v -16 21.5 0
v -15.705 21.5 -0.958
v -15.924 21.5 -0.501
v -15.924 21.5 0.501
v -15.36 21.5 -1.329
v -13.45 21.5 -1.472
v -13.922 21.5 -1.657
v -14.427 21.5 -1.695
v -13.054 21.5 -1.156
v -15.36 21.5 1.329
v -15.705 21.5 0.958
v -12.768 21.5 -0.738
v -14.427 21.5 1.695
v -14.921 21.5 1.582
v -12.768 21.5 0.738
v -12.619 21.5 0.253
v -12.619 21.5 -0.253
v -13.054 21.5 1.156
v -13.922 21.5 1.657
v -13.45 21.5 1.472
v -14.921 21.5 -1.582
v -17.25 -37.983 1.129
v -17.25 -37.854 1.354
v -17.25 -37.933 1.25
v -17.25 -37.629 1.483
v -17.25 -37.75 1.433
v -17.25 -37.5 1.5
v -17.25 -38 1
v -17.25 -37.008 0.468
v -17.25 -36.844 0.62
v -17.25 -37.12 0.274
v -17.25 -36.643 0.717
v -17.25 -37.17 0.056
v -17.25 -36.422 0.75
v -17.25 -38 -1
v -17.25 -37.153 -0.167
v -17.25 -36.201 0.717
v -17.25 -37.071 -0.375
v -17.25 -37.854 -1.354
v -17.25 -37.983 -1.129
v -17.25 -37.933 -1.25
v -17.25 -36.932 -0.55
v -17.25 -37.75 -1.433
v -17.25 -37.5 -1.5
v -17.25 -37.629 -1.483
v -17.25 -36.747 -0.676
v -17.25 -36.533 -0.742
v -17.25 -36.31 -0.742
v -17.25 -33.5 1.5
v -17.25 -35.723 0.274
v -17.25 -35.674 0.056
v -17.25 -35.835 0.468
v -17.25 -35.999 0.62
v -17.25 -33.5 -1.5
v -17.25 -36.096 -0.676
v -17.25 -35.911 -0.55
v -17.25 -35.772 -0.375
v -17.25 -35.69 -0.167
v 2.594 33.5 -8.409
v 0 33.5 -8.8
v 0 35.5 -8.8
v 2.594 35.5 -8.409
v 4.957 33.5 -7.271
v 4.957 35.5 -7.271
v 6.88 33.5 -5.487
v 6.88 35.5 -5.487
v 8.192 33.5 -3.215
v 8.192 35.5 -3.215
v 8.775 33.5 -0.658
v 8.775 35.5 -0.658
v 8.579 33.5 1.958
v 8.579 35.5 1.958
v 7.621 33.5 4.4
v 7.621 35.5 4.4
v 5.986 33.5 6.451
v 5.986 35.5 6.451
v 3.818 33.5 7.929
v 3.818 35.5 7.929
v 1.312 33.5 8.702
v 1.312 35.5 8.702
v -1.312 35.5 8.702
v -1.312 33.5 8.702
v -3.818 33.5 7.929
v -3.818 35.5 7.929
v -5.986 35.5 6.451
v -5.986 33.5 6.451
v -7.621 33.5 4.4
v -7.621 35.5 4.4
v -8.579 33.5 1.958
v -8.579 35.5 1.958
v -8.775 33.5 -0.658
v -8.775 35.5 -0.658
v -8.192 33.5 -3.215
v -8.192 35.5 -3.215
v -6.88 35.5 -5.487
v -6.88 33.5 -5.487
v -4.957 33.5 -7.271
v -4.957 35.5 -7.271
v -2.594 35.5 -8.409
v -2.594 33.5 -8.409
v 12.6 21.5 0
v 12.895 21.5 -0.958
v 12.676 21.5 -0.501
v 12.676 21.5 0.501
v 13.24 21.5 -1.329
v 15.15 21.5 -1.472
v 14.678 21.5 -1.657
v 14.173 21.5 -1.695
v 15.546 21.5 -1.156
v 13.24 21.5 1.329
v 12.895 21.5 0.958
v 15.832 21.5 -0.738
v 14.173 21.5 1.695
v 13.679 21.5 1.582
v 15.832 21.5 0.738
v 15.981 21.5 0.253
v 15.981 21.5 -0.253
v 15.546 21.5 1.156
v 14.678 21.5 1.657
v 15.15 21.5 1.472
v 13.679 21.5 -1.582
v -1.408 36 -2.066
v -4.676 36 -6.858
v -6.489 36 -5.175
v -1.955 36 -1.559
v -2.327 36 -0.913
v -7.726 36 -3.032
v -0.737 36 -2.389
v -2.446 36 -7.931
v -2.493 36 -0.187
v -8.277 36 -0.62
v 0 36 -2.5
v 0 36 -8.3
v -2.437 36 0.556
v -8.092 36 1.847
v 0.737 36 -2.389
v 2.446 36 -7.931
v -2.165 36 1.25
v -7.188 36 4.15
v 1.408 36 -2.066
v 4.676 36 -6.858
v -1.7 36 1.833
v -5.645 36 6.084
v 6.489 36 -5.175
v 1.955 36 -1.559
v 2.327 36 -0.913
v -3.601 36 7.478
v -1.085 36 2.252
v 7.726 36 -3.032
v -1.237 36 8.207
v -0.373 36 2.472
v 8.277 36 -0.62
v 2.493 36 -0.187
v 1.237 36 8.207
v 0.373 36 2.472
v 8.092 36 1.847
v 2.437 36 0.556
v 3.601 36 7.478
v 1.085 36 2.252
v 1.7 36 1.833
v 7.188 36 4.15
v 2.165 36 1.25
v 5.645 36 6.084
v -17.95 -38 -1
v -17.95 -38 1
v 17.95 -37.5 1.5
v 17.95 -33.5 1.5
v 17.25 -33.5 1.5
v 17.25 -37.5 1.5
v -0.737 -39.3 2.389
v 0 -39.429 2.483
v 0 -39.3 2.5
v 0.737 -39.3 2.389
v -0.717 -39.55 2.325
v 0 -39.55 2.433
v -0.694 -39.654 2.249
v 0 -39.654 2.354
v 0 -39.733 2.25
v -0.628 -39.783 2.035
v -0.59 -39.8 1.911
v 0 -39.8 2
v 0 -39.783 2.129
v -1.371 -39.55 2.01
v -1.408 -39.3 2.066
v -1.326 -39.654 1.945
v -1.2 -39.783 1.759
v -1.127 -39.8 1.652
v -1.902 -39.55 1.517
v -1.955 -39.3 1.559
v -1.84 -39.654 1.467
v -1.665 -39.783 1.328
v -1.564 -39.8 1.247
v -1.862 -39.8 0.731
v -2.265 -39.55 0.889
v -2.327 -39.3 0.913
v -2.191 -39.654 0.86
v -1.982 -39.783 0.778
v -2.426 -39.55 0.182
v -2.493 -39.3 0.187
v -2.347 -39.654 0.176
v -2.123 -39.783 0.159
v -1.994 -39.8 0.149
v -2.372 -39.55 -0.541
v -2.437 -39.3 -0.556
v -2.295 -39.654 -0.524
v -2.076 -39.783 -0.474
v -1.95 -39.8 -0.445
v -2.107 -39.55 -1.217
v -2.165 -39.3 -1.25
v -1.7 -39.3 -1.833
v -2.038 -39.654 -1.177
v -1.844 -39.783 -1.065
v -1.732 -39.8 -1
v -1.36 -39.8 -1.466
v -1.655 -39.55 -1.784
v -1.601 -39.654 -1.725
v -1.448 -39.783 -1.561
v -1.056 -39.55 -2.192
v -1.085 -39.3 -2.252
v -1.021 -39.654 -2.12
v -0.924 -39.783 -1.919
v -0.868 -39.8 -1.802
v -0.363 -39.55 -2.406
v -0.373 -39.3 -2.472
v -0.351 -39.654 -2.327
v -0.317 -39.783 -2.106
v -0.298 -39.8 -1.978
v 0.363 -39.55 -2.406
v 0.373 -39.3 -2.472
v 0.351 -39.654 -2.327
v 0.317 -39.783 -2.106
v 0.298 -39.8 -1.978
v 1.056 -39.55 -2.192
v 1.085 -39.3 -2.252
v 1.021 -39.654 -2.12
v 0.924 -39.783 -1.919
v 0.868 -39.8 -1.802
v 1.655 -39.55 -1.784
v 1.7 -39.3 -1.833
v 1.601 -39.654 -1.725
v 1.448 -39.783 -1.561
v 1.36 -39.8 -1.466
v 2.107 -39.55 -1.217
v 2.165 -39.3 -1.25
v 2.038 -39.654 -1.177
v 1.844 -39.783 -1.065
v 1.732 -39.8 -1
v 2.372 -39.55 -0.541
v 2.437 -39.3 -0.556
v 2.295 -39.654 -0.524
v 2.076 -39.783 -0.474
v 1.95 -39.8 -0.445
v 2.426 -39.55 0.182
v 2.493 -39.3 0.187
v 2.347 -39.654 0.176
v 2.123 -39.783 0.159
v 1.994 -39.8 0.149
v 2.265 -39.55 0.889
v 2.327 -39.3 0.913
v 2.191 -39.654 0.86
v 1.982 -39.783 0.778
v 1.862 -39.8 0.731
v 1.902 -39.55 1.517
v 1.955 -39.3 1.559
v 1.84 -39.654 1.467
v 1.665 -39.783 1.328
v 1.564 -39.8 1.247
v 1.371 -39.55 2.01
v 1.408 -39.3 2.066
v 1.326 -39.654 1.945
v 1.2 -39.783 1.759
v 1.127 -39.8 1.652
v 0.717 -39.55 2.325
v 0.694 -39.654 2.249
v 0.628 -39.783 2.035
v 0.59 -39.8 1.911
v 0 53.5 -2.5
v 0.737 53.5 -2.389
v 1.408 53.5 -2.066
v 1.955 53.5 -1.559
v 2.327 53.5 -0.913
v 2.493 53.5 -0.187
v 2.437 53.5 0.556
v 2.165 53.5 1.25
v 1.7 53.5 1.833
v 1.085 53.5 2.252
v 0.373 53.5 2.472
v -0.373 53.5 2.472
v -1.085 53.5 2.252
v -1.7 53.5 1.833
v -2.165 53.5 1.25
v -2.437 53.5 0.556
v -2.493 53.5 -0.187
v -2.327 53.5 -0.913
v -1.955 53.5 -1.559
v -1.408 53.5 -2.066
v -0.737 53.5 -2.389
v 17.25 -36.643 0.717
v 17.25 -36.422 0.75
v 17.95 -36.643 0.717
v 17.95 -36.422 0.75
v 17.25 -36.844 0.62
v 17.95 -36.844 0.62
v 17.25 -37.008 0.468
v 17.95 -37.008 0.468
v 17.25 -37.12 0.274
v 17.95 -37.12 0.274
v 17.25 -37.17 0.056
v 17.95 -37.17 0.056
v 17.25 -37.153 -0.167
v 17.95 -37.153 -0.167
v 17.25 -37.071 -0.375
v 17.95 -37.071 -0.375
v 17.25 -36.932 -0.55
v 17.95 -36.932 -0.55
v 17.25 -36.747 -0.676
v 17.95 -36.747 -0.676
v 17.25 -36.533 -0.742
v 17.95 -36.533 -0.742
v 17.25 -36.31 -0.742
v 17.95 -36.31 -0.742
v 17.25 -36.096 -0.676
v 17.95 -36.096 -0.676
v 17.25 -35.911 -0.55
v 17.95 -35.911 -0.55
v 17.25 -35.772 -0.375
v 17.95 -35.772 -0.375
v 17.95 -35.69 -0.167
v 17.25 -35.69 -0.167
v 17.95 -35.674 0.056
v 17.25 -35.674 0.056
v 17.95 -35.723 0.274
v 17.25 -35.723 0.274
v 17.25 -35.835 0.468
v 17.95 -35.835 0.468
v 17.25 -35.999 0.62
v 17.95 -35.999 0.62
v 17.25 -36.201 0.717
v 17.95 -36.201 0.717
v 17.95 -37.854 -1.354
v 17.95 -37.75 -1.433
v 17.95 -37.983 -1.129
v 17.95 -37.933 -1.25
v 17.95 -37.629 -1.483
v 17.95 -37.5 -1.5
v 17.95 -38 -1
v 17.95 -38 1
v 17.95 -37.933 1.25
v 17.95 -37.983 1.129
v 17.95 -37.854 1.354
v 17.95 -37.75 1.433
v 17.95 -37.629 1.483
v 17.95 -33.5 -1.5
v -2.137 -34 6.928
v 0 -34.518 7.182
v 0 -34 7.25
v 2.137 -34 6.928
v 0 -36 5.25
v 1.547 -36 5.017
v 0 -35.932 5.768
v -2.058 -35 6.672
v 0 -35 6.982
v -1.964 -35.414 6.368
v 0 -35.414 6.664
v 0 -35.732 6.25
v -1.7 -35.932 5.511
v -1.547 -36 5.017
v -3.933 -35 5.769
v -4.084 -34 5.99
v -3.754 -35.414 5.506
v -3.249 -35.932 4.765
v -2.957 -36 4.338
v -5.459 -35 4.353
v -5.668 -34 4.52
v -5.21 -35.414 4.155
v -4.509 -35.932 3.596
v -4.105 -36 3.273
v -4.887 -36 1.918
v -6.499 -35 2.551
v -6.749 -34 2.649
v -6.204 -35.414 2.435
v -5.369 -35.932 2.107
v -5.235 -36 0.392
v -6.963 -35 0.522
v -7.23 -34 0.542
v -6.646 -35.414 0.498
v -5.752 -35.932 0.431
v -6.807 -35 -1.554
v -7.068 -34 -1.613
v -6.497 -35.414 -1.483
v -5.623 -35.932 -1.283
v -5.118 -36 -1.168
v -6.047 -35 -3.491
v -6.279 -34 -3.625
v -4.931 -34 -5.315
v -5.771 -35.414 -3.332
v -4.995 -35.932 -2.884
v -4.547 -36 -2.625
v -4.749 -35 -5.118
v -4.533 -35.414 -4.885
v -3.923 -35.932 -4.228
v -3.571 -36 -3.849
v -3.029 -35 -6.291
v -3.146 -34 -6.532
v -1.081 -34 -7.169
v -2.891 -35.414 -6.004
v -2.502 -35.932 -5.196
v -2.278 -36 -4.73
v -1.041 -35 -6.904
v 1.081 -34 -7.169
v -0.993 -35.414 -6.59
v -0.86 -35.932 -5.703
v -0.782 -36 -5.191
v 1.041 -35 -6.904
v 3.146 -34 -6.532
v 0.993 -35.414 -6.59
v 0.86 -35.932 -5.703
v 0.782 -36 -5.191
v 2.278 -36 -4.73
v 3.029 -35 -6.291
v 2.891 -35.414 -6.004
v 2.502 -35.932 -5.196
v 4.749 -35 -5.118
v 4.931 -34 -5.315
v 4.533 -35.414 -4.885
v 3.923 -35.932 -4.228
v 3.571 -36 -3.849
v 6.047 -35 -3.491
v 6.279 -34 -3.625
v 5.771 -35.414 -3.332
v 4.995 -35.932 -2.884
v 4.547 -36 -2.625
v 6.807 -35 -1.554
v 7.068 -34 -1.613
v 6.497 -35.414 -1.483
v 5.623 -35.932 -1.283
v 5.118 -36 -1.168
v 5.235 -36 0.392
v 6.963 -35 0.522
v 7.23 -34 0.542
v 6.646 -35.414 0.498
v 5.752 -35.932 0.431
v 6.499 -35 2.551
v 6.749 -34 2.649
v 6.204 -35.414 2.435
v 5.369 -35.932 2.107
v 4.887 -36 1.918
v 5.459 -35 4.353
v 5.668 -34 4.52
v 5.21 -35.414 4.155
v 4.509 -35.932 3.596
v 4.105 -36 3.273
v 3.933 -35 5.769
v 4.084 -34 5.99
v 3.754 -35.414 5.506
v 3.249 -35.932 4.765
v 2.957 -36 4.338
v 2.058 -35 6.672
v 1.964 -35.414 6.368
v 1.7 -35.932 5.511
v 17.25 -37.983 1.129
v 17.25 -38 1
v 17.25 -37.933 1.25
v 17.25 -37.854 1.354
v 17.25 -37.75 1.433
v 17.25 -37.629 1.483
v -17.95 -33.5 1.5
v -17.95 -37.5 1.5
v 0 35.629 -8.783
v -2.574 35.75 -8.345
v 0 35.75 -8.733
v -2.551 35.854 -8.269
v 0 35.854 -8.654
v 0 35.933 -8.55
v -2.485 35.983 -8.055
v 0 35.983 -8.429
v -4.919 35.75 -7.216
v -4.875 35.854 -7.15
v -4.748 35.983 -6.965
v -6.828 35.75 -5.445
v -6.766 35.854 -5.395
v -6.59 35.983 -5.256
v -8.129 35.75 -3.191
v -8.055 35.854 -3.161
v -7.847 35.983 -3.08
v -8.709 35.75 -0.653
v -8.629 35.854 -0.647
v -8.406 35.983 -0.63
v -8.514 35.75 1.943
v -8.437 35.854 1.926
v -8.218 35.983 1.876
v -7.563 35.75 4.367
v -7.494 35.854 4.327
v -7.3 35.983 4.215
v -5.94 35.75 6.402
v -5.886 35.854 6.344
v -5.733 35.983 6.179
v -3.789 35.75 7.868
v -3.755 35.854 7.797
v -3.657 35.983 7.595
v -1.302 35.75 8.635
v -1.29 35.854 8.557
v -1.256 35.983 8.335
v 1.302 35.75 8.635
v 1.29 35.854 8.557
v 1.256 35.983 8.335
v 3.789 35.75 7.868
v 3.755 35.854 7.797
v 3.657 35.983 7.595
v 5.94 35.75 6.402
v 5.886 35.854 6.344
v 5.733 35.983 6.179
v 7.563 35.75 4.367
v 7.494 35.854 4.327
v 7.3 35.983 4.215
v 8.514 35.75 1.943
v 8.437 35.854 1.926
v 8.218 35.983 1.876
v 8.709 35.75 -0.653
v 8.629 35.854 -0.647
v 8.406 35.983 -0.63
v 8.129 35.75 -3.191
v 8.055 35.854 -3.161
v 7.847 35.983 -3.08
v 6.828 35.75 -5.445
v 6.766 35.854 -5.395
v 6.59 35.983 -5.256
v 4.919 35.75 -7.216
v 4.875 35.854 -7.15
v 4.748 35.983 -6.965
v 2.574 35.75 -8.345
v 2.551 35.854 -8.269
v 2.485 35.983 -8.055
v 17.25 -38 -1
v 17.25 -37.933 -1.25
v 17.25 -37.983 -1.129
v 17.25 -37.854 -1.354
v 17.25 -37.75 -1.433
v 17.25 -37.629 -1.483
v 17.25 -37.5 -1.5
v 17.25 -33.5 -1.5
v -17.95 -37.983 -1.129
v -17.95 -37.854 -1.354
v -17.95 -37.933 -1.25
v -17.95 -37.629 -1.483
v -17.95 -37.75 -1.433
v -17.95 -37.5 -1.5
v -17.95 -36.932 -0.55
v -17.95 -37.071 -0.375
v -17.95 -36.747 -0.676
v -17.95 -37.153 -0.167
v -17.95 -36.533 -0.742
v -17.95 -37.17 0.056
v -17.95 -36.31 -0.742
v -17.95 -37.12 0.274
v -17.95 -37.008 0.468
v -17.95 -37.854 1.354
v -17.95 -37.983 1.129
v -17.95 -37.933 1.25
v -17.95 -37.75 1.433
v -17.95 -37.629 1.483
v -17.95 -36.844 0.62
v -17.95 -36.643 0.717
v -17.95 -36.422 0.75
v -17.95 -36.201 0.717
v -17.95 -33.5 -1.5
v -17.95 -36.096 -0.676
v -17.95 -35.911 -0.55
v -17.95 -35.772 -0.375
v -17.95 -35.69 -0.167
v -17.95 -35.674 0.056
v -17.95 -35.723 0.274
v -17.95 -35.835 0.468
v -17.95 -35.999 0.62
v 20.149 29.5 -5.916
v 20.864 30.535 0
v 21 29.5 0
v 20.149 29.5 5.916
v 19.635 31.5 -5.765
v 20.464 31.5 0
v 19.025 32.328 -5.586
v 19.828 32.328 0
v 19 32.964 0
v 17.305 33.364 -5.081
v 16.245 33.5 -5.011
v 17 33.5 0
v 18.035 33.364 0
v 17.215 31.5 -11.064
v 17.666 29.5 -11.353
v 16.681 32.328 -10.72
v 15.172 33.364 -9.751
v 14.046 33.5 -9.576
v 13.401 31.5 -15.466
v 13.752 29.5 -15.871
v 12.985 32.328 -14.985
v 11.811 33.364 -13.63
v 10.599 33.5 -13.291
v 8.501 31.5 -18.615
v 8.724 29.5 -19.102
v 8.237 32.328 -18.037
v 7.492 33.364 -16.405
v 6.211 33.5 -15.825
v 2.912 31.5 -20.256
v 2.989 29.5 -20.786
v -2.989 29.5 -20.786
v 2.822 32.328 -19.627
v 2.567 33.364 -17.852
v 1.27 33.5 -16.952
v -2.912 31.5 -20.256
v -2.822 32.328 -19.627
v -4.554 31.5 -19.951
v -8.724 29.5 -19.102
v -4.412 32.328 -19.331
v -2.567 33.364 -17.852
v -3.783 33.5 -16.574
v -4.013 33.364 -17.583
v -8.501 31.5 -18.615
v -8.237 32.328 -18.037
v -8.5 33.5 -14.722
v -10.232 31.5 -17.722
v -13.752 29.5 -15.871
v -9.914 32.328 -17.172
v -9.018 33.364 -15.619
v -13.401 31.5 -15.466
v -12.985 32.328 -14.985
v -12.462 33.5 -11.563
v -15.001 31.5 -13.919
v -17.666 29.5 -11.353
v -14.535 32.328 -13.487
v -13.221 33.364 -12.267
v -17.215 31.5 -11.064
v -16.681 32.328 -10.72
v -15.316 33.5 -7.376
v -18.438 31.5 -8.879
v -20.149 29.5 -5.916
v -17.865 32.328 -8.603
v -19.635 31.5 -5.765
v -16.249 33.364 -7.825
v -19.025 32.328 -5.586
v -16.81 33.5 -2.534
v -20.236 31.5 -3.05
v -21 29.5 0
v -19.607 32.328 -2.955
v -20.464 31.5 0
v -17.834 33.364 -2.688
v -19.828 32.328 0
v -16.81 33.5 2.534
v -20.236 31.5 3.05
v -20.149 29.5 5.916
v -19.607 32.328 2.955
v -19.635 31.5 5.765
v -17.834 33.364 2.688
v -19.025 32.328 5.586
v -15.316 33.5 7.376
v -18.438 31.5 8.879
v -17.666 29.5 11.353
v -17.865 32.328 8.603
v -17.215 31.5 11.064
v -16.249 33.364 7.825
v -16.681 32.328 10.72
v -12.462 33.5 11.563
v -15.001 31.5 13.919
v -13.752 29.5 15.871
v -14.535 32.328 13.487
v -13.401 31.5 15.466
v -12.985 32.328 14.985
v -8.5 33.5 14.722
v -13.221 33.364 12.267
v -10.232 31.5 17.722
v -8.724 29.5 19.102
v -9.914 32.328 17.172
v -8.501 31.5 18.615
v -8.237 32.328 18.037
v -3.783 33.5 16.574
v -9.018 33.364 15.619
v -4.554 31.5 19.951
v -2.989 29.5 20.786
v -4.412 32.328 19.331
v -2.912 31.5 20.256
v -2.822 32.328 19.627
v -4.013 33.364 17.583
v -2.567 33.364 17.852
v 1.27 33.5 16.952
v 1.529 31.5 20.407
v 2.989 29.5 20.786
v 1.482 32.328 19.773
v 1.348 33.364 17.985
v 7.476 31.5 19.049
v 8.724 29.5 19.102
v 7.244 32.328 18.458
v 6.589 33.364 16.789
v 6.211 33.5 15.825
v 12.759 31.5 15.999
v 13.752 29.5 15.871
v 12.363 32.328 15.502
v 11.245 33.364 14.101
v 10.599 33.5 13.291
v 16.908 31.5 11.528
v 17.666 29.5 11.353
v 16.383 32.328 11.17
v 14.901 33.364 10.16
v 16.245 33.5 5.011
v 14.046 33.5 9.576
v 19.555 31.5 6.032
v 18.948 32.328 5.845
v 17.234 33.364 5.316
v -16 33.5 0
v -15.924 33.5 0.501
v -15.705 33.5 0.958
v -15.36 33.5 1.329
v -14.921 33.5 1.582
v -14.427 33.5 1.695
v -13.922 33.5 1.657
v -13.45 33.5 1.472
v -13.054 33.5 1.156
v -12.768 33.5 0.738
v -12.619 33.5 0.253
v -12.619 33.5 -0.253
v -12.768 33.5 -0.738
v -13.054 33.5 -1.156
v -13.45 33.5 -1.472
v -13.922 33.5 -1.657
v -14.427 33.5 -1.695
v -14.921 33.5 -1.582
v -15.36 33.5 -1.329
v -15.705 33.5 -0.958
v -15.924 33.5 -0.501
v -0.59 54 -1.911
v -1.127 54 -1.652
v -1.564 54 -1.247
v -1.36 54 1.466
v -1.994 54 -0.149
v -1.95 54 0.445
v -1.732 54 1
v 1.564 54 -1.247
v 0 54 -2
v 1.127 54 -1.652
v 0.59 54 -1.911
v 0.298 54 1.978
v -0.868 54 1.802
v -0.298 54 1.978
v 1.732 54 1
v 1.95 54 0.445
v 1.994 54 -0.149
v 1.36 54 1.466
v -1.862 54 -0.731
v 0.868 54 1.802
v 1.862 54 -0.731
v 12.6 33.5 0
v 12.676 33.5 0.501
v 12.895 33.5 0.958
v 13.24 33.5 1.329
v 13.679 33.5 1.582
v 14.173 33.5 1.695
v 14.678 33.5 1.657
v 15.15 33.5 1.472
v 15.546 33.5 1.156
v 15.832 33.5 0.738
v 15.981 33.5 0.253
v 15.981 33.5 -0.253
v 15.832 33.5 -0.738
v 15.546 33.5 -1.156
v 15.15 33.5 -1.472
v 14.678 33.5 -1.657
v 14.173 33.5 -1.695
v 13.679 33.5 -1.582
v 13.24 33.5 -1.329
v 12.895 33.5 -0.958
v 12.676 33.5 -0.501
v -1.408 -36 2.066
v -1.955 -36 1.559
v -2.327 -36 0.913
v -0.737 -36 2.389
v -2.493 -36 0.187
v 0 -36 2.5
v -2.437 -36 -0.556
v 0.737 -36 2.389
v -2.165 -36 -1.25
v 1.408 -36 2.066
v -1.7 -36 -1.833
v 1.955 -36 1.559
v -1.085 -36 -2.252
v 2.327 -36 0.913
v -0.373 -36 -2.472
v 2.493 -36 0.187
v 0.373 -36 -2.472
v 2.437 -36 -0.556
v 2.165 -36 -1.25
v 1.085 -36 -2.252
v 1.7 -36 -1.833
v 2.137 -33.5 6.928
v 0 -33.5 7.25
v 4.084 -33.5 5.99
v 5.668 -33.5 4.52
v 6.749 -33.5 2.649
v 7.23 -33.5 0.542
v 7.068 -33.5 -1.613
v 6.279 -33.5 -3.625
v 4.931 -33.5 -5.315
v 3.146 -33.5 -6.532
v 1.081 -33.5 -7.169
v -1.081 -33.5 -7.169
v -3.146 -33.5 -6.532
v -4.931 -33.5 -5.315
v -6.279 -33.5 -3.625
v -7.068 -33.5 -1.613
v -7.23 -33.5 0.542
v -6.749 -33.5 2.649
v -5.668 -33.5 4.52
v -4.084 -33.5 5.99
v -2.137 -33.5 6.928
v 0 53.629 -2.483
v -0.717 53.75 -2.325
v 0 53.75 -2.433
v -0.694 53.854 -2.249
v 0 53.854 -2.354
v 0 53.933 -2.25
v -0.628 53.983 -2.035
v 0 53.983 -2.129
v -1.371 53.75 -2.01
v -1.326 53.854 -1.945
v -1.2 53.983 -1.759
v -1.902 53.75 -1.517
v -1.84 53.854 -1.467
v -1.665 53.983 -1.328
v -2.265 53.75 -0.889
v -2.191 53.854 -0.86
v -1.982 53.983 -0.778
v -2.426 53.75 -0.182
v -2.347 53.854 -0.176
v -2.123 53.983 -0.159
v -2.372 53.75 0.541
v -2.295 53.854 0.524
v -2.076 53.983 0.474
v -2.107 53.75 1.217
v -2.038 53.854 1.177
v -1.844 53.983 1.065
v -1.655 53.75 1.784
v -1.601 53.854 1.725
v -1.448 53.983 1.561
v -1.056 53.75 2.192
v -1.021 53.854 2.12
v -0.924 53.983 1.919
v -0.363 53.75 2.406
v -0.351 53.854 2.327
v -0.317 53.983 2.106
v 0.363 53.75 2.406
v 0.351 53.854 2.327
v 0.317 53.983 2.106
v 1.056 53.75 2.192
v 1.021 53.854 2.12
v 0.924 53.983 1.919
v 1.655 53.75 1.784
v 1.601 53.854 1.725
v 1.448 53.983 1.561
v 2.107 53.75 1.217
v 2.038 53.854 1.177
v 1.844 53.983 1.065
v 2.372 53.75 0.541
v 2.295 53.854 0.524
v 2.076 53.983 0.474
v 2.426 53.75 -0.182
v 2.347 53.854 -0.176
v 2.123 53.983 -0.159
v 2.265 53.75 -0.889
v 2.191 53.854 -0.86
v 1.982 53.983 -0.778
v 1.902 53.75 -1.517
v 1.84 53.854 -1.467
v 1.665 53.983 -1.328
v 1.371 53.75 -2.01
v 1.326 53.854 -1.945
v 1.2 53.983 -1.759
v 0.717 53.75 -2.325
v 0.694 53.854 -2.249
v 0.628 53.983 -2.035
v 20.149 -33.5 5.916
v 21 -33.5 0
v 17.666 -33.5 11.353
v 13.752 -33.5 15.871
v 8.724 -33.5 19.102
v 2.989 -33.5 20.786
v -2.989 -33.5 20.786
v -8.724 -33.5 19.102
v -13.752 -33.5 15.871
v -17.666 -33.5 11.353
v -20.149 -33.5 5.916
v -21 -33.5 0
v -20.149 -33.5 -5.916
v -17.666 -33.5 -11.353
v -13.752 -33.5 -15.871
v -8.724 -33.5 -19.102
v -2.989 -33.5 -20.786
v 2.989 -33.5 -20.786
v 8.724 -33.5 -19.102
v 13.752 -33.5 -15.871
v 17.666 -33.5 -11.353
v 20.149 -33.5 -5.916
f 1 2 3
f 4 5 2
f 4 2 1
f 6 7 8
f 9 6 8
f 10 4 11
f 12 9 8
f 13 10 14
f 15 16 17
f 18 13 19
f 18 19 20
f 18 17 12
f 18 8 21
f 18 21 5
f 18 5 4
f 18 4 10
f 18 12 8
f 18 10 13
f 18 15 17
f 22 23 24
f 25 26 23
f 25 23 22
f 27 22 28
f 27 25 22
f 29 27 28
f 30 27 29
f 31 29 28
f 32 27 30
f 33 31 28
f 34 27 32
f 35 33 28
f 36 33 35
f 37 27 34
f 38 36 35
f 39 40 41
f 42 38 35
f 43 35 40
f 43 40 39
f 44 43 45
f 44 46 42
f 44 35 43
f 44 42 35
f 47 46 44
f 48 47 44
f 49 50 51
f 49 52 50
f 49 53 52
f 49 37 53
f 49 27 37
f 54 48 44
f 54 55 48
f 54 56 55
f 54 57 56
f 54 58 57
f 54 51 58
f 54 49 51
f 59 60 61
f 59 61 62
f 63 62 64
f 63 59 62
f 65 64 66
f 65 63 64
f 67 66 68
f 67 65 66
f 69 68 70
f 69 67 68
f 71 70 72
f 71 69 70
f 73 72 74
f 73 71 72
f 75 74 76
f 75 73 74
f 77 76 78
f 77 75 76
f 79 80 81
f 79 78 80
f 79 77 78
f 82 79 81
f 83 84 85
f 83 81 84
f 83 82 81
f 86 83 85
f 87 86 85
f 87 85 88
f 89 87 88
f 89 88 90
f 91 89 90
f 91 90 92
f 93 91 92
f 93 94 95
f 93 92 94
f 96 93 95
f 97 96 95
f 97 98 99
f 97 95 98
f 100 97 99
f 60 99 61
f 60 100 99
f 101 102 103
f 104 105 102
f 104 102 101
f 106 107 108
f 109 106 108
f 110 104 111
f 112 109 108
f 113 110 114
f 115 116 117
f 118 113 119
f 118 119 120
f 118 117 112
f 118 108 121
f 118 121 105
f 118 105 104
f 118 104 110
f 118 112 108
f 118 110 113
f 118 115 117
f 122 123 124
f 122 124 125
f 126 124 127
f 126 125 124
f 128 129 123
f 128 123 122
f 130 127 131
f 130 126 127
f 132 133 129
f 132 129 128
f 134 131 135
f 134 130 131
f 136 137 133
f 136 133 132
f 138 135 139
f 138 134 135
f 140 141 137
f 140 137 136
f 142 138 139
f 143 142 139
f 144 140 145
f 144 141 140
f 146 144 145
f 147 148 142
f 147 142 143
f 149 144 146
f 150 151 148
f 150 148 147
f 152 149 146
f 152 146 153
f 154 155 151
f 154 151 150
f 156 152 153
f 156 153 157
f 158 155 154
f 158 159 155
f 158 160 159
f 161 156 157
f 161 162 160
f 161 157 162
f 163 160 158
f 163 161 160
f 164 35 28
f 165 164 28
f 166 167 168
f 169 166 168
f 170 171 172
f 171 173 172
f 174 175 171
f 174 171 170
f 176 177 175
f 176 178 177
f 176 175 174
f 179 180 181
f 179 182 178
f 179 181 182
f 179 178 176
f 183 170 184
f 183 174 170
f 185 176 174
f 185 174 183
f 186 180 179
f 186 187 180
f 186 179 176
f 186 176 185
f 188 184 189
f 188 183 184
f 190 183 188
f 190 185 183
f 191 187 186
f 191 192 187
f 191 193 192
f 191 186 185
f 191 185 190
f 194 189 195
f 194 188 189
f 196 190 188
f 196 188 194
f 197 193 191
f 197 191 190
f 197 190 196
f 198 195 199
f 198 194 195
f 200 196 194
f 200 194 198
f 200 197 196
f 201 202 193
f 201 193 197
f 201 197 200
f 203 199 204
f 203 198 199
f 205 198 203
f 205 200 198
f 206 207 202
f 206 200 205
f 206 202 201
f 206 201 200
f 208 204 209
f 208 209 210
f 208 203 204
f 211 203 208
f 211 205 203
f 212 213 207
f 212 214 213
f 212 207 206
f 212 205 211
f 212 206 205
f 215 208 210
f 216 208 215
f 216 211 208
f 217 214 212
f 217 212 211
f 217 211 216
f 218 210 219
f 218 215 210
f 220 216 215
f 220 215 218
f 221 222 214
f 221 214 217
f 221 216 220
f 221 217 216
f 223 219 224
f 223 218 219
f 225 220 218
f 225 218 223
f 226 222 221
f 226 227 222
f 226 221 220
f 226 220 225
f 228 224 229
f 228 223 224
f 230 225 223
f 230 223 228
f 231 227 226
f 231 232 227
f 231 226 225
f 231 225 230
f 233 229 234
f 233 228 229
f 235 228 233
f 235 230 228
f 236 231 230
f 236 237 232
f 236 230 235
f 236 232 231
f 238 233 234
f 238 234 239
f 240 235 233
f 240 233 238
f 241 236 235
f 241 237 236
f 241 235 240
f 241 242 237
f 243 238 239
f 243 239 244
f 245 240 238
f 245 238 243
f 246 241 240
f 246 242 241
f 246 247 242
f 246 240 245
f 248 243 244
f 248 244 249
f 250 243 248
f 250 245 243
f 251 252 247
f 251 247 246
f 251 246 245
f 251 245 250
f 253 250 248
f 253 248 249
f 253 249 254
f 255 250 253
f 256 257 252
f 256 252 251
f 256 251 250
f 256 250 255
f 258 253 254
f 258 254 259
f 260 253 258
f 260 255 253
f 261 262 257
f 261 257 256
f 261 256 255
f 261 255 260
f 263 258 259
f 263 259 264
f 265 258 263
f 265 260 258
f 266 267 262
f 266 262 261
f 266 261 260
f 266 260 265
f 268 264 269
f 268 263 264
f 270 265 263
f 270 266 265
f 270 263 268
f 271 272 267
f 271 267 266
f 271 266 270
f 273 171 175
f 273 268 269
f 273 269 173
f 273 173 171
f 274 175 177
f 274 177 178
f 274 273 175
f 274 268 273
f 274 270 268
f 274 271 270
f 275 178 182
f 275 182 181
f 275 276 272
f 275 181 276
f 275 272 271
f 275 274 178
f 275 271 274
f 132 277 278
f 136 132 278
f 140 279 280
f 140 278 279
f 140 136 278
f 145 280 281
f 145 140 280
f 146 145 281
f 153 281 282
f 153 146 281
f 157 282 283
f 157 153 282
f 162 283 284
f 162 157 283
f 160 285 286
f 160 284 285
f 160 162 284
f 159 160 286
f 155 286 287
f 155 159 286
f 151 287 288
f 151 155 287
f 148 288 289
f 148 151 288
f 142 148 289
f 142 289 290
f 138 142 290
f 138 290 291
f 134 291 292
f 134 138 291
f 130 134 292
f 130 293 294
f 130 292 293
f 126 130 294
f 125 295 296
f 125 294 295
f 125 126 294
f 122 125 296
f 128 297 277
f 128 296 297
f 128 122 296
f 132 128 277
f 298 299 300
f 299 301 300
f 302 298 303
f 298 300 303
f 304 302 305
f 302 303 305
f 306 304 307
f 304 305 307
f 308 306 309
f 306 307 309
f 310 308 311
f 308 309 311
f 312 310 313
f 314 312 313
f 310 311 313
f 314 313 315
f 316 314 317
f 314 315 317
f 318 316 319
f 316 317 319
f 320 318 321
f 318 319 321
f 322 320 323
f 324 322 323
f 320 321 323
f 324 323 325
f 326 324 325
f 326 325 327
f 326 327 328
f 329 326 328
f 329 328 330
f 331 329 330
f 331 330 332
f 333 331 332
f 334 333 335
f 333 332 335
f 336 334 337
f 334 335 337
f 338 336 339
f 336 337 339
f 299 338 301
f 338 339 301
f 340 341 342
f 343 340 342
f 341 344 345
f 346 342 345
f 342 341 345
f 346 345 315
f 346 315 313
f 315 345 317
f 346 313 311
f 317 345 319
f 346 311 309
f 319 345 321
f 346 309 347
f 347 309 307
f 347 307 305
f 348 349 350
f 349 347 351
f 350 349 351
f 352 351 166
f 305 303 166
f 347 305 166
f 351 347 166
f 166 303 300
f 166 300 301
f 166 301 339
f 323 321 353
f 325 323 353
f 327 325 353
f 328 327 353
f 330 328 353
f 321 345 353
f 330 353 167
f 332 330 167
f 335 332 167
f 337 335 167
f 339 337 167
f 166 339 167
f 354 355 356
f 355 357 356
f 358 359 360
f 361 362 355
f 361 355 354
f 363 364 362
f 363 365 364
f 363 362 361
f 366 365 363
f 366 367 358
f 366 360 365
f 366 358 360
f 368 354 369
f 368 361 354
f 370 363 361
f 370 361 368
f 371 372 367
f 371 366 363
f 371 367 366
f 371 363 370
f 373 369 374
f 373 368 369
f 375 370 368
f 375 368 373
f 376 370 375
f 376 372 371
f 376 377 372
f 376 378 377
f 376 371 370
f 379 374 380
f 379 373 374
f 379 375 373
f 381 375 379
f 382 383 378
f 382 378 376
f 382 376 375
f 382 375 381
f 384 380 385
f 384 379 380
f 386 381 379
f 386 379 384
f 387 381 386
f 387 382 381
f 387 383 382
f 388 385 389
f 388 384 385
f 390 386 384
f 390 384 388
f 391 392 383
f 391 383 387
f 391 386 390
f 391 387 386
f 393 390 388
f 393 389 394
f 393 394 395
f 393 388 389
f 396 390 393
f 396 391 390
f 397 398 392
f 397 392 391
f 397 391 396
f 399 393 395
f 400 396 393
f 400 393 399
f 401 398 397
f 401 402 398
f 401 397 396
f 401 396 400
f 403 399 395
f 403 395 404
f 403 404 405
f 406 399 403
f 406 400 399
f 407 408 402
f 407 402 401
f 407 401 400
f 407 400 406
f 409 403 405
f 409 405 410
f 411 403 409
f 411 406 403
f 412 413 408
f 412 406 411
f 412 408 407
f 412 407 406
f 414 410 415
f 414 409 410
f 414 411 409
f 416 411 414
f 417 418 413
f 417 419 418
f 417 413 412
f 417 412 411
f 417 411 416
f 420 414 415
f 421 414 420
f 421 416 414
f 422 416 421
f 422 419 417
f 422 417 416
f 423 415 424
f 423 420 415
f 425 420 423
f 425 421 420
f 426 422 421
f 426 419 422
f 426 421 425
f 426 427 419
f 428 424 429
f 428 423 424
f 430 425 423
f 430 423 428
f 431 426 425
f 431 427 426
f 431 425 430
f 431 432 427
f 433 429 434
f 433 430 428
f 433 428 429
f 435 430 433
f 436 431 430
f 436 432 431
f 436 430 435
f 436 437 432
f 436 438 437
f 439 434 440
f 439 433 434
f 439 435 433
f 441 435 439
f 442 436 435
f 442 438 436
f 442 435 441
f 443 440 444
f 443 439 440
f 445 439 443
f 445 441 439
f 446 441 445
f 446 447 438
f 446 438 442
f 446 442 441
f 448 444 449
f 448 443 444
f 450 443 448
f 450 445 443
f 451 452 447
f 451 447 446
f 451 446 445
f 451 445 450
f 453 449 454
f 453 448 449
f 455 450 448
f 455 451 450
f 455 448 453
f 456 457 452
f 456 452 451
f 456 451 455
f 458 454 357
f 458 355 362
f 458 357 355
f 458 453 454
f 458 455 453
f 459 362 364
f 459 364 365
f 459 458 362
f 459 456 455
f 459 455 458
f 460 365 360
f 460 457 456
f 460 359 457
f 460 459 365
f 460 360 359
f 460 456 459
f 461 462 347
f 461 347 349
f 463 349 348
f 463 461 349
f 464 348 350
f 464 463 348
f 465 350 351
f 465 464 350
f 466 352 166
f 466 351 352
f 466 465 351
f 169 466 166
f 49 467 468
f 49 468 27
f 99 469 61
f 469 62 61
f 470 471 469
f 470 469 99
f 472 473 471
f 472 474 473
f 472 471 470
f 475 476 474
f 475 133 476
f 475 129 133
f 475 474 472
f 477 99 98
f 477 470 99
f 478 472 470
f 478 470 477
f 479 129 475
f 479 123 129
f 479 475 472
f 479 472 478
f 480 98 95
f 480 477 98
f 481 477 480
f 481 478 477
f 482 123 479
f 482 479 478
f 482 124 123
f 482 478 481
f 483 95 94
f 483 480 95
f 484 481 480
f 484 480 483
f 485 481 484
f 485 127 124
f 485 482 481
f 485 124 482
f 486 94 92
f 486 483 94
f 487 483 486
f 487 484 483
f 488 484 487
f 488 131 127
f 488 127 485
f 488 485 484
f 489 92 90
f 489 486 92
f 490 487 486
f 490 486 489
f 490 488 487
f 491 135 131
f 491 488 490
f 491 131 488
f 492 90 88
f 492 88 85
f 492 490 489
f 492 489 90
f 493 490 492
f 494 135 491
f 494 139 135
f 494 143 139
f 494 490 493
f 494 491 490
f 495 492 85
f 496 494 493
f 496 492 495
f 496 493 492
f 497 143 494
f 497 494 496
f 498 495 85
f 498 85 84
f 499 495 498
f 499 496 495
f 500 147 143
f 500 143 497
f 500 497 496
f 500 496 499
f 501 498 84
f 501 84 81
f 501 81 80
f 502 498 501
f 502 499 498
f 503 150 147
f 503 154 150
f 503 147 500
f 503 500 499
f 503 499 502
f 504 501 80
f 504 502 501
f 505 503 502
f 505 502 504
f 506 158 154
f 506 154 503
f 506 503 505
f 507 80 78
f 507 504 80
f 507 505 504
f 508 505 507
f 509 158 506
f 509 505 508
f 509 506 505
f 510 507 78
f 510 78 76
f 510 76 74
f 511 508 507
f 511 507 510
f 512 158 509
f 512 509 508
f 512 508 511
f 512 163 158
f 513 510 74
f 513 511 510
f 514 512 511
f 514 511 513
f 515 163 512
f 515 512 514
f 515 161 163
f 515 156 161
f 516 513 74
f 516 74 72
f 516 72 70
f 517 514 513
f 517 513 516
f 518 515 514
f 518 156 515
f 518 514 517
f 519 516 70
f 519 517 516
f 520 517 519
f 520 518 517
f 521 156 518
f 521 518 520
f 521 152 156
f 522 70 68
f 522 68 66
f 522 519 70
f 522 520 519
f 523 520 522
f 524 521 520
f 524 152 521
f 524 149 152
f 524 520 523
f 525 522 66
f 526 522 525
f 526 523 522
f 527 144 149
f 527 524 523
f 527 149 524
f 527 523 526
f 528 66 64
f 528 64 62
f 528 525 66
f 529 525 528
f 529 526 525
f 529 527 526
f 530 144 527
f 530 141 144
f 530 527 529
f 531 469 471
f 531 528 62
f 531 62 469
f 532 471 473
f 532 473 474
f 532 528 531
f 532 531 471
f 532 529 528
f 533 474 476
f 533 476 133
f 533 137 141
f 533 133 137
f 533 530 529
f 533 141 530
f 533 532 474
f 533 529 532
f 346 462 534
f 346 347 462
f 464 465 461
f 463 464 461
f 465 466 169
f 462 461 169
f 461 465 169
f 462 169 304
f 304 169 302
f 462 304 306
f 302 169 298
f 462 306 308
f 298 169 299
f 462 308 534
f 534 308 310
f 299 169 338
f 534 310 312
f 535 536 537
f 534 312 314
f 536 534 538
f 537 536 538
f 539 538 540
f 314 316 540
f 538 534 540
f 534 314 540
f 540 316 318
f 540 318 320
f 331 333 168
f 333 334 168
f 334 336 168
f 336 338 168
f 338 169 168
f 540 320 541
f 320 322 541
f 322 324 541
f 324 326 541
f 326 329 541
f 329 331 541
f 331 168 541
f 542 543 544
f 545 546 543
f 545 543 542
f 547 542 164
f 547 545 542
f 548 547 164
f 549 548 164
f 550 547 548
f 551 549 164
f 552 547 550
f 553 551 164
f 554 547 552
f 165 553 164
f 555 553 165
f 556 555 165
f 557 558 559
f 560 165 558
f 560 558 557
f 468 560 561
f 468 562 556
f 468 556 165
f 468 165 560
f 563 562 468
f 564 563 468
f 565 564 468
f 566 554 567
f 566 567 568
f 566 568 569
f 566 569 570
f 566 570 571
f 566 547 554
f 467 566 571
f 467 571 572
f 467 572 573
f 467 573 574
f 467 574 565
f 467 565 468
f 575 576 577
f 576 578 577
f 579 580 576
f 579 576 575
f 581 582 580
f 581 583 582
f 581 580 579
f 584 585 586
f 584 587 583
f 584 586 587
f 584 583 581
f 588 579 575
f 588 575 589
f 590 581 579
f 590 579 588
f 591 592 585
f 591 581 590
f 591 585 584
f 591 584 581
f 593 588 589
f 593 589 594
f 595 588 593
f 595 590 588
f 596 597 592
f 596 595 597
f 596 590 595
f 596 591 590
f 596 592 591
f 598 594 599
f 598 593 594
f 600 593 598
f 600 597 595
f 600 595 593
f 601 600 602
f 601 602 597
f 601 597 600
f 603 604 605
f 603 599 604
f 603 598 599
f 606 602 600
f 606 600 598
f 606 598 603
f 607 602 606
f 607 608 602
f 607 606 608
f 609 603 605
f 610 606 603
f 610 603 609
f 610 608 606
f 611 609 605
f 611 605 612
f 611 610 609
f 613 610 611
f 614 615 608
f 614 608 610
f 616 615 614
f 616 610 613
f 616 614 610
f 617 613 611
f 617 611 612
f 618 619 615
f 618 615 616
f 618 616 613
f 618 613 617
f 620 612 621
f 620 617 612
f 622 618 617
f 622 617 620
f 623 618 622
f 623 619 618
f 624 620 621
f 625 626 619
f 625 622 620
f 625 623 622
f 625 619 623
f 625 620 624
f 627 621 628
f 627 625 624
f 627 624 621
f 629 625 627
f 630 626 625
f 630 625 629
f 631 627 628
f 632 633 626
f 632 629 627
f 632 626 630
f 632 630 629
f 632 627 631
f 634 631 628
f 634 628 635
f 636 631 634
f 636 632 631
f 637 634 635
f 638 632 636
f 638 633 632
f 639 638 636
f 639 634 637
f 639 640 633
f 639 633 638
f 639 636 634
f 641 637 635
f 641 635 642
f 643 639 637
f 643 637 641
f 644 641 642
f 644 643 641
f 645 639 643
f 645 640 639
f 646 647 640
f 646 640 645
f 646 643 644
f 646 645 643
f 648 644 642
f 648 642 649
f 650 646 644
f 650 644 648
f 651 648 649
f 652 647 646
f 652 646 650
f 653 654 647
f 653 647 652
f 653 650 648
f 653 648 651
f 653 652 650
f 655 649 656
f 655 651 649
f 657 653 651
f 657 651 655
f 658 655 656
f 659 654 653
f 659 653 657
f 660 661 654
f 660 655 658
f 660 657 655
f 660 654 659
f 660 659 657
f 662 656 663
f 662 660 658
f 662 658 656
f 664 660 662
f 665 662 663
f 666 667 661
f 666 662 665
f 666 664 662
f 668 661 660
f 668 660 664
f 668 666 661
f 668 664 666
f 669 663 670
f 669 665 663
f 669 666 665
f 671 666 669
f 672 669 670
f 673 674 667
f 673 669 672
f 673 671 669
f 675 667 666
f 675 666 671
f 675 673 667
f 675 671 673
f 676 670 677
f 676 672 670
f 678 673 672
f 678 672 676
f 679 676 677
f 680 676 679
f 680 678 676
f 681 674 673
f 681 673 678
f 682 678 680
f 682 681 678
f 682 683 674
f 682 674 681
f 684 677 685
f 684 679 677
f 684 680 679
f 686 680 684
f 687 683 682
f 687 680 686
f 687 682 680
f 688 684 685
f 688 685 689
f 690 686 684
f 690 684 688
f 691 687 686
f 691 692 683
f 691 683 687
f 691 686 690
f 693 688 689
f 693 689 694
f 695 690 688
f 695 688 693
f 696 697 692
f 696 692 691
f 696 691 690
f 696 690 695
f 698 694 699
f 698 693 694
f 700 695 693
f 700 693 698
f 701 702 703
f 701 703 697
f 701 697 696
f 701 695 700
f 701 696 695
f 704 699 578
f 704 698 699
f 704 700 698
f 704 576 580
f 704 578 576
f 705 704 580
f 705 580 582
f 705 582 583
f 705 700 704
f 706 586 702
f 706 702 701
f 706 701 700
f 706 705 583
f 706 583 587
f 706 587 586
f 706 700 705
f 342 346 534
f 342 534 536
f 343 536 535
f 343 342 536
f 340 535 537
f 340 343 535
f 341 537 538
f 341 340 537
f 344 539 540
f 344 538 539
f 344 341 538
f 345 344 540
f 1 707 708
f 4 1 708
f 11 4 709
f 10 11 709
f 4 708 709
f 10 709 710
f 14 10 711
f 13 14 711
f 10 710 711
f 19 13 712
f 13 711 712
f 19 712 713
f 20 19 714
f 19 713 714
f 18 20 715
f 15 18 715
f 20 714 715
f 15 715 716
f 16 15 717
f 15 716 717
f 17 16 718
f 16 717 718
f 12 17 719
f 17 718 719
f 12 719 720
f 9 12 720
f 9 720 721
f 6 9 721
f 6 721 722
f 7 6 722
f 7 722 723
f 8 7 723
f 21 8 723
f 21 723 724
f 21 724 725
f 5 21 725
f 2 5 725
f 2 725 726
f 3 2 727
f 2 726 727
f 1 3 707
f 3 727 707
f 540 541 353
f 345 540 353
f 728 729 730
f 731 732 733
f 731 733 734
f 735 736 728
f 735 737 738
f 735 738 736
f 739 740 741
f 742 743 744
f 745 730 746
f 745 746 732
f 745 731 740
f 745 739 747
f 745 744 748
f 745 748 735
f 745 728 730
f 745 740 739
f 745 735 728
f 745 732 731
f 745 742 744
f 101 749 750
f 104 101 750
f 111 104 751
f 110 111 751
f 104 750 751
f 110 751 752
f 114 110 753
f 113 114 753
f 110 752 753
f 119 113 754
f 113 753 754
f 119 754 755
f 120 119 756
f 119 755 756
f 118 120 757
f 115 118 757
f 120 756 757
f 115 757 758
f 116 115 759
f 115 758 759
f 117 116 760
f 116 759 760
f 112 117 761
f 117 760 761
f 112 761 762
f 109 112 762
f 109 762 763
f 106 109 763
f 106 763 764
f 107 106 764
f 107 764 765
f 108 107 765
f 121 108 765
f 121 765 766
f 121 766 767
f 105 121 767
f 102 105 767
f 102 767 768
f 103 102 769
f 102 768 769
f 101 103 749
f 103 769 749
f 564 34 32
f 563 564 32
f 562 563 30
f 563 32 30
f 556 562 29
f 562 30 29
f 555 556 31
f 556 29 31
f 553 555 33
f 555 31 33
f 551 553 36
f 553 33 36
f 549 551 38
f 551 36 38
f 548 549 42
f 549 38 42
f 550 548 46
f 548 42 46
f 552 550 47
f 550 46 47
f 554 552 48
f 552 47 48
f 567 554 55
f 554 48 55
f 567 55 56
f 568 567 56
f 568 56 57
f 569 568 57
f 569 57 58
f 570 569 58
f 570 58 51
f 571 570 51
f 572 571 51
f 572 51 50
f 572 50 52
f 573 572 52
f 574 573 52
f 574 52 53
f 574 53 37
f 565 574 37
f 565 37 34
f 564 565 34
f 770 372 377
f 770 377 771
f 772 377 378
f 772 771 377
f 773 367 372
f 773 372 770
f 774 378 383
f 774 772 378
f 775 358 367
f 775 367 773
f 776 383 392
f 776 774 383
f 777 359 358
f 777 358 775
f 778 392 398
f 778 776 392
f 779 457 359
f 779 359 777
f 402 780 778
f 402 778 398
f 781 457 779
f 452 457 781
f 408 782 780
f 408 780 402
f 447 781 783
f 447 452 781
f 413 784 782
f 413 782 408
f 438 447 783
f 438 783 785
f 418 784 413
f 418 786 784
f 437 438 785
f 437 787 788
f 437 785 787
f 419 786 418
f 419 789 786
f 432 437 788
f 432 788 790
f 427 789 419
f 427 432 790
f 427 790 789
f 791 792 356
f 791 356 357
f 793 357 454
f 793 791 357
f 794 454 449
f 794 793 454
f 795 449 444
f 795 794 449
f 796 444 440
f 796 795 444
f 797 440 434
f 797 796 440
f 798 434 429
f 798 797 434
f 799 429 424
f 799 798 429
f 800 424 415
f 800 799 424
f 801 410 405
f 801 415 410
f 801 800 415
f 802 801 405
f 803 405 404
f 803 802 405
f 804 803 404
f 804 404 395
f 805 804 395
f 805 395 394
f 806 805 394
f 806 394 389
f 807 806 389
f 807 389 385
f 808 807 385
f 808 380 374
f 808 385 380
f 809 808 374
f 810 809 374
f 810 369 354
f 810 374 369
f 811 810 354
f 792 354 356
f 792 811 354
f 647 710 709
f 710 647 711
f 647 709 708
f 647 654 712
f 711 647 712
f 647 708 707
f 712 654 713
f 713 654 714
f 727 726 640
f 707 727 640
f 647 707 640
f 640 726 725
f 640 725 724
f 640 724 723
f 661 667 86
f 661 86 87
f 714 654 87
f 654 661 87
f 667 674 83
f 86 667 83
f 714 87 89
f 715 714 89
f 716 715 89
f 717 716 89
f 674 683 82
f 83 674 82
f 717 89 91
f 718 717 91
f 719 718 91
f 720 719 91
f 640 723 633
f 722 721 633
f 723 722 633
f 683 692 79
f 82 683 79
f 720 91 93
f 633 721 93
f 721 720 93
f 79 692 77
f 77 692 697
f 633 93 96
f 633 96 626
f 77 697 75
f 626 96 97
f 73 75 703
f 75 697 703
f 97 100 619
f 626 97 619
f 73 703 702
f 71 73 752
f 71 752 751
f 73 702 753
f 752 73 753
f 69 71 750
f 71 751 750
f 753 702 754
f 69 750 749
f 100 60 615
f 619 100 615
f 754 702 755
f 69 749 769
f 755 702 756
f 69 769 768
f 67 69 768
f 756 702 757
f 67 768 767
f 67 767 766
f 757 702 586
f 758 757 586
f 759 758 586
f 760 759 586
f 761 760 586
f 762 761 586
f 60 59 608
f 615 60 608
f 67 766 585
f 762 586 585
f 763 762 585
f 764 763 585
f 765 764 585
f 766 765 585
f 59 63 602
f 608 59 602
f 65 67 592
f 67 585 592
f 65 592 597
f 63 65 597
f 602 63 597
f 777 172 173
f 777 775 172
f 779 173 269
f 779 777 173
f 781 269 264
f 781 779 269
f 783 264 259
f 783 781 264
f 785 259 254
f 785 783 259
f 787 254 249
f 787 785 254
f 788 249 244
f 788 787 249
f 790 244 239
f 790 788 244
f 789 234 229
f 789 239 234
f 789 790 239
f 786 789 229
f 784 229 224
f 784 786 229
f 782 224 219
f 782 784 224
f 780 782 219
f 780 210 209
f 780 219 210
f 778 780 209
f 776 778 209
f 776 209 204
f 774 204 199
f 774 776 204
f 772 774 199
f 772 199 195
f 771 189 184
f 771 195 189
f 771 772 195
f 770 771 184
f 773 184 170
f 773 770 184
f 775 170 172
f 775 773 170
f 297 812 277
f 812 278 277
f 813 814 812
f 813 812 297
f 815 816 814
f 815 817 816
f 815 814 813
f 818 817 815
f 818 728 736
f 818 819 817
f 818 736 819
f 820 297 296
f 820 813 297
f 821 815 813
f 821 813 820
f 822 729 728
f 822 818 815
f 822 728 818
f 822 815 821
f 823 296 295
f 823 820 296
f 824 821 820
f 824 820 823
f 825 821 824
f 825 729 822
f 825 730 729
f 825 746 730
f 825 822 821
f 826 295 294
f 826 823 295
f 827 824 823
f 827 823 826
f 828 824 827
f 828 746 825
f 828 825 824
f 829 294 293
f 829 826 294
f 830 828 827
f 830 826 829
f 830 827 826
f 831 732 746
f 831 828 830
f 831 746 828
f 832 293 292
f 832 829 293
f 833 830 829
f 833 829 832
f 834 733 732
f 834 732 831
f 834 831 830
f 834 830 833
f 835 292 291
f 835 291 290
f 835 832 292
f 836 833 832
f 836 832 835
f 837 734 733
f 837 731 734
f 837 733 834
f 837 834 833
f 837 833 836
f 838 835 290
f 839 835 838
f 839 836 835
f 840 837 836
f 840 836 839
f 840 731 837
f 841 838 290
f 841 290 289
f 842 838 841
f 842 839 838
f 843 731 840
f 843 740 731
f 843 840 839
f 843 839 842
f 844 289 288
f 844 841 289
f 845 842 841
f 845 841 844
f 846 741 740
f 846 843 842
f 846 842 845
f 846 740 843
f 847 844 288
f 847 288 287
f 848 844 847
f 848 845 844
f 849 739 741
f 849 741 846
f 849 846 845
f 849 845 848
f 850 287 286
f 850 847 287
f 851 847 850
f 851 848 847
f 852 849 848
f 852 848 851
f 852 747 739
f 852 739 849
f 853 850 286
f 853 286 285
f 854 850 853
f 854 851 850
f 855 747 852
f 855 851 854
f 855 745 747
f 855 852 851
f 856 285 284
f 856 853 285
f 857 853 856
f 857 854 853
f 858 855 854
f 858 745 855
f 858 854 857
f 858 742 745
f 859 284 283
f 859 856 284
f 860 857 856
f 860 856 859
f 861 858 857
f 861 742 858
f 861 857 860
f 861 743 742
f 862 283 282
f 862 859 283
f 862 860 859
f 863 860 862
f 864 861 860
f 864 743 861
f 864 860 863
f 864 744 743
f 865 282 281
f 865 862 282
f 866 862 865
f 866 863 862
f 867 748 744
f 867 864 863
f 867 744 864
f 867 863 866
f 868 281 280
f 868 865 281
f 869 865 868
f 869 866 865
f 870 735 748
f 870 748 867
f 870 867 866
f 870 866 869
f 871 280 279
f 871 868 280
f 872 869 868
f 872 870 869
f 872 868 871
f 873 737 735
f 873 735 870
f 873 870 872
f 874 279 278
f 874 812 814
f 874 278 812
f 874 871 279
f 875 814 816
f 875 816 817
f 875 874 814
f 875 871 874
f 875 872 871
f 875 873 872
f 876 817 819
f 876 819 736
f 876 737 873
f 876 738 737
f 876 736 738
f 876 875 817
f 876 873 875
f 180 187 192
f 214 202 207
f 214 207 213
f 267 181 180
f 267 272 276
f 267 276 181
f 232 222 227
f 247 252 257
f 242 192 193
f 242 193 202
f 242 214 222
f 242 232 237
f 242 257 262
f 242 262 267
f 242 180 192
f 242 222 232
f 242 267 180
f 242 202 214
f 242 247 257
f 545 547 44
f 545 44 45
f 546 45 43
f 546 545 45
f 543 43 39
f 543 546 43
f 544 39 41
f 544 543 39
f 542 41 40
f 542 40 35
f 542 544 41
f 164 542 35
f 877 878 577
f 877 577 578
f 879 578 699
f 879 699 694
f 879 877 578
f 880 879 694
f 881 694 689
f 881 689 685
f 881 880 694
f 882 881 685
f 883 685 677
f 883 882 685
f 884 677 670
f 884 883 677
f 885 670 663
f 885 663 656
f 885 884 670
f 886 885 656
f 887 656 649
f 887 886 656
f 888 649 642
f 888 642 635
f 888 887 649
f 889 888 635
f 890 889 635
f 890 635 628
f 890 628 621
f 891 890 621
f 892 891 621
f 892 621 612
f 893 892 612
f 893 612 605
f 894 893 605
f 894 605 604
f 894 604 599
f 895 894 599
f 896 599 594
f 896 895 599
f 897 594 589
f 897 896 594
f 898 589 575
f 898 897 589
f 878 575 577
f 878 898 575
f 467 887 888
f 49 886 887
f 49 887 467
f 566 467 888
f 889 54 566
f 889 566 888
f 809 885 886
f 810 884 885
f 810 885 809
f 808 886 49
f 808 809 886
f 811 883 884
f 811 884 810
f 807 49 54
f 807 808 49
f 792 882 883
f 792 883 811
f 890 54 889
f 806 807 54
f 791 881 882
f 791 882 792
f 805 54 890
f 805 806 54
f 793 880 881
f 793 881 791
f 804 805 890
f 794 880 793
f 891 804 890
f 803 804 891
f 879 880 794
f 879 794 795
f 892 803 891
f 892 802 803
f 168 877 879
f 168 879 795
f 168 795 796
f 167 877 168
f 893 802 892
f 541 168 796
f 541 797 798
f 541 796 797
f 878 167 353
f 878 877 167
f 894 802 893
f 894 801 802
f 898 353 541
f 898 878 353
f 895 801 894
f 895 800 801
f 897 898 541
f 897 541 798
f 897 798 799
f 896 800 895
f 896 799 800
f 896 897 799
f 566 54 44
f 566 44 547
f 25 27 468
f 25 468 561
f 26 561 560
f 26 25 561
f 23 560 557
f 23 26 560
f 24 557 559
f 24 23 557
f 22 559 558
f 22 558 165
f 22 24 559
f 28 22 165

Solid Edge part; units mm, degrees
sketch "Sketch1" plane through (0, 0, 0) normal (0, -1, 0) x (1, 0, 0)
  circle A0 centre (0, 0) radius 21
extrude "Protrusion1" add sketch "Sketch1" along normal mid plane 67
fillet "Round_1" radius 4 1 edges at (-21, 33.5, 0)
sketch "Sketch2" plane through (0, 33.5, 0) normal (0, 1, 0) x (0, 0, -1)
  circle A0 centre (0, 0) radius 8.8
extrude "ExtrudedProtrusion_2" add sketch "Sketch2" along normal mid plane 5
sketch "Sketch3" plane through (0, 36, 0) normal (0, 1, 0) x (0, 0, -1)
  circle A0 centre (0, 0) radius 2.5
extrude "ExtrudedProtrusion_3" add sketch "Sketch3" along normal blind 18
fillet "Round_2" radius 0.5 2 edges at (0, 36, 8.8) (0, 54, 2.5)
sketch "Sketch4" plane through (0, 33.5, 0) normal (0, 1, 0) x (-1, 0, 0)
  circle A0 centre (14.3, 0) radius 1.7
  circle A1 centre (-14.3, 0) radius 1.7
extrude "ExtrudedCutout_1" cut sketch "Sketch4" against normal blind 12
sketch "Sketch5" plane through (0, -33.5, 0) normal (0, -1, 0) x (1, 0, 0)
  line L0 (17.25, -1.5) -> (17.95, -1.5)
  line L1 (17.95, -1.5) -> (17.95, 1.5)
  line L2 (17.95, 1.5) -> (17.25, 1.5)
  line L3 (17.25, 1.5) -> (17.25, -1.5)
  line L4 (-17.25, -1.5) -> (-17.95, -1.5)
  line L5 (-17.95, -1.5) -> (-17.95, 1.5)
  line L6 (-17.95, 1.5) -> (-17.25, 1.5)
  line L7 (-17.25, 1.5) -> (-17.25, -1.5)
extrude "ExtrudedProtrusion_4" add sketch "Sketch5" along normal mid plane 9
fillet "Round_3" radius 0.5 4 edges at (-17.6, -38, -1.5) (-17.6, -38, 1.5) (17.6, -38, -1.5) (17.6, -38, 1.5)
sketch "Sketch6" plane through (17.95, -35.75, 0) normal (1, 0, 0) x (0, 0, 1)
  circle A0 centre (0, 0.6716) radius 0.75
extrude "ExtrudedCutout_2" cut sketch "Sketch6" against normal blind 70
sketch "Sketch7" plane through (0, -33.5, 0) normal (0, -1, 0) x (0, 0, 1)
  circle A0 centre (0, 0) radius 7.25
extrude "ExtrudedProtrusion_5" add sketch "Sketch7" along normal mid plane 5
fillet "Round_4" radius 2 1 edges at (0, -36, -7.25)
sketch "Sketch8" plane through (0, -36, 0) normal (0, -1, 0) x (0, 0, 1)
  circle A0 centre (0, 0) radius 2.5
extrude "ExtrudedProtrusion_6" add sketch "Sketch8" along normal mid plane 7.6
fillet "Round_5" radius 0.5 1 edges at (0, -39.8, -2.5)
